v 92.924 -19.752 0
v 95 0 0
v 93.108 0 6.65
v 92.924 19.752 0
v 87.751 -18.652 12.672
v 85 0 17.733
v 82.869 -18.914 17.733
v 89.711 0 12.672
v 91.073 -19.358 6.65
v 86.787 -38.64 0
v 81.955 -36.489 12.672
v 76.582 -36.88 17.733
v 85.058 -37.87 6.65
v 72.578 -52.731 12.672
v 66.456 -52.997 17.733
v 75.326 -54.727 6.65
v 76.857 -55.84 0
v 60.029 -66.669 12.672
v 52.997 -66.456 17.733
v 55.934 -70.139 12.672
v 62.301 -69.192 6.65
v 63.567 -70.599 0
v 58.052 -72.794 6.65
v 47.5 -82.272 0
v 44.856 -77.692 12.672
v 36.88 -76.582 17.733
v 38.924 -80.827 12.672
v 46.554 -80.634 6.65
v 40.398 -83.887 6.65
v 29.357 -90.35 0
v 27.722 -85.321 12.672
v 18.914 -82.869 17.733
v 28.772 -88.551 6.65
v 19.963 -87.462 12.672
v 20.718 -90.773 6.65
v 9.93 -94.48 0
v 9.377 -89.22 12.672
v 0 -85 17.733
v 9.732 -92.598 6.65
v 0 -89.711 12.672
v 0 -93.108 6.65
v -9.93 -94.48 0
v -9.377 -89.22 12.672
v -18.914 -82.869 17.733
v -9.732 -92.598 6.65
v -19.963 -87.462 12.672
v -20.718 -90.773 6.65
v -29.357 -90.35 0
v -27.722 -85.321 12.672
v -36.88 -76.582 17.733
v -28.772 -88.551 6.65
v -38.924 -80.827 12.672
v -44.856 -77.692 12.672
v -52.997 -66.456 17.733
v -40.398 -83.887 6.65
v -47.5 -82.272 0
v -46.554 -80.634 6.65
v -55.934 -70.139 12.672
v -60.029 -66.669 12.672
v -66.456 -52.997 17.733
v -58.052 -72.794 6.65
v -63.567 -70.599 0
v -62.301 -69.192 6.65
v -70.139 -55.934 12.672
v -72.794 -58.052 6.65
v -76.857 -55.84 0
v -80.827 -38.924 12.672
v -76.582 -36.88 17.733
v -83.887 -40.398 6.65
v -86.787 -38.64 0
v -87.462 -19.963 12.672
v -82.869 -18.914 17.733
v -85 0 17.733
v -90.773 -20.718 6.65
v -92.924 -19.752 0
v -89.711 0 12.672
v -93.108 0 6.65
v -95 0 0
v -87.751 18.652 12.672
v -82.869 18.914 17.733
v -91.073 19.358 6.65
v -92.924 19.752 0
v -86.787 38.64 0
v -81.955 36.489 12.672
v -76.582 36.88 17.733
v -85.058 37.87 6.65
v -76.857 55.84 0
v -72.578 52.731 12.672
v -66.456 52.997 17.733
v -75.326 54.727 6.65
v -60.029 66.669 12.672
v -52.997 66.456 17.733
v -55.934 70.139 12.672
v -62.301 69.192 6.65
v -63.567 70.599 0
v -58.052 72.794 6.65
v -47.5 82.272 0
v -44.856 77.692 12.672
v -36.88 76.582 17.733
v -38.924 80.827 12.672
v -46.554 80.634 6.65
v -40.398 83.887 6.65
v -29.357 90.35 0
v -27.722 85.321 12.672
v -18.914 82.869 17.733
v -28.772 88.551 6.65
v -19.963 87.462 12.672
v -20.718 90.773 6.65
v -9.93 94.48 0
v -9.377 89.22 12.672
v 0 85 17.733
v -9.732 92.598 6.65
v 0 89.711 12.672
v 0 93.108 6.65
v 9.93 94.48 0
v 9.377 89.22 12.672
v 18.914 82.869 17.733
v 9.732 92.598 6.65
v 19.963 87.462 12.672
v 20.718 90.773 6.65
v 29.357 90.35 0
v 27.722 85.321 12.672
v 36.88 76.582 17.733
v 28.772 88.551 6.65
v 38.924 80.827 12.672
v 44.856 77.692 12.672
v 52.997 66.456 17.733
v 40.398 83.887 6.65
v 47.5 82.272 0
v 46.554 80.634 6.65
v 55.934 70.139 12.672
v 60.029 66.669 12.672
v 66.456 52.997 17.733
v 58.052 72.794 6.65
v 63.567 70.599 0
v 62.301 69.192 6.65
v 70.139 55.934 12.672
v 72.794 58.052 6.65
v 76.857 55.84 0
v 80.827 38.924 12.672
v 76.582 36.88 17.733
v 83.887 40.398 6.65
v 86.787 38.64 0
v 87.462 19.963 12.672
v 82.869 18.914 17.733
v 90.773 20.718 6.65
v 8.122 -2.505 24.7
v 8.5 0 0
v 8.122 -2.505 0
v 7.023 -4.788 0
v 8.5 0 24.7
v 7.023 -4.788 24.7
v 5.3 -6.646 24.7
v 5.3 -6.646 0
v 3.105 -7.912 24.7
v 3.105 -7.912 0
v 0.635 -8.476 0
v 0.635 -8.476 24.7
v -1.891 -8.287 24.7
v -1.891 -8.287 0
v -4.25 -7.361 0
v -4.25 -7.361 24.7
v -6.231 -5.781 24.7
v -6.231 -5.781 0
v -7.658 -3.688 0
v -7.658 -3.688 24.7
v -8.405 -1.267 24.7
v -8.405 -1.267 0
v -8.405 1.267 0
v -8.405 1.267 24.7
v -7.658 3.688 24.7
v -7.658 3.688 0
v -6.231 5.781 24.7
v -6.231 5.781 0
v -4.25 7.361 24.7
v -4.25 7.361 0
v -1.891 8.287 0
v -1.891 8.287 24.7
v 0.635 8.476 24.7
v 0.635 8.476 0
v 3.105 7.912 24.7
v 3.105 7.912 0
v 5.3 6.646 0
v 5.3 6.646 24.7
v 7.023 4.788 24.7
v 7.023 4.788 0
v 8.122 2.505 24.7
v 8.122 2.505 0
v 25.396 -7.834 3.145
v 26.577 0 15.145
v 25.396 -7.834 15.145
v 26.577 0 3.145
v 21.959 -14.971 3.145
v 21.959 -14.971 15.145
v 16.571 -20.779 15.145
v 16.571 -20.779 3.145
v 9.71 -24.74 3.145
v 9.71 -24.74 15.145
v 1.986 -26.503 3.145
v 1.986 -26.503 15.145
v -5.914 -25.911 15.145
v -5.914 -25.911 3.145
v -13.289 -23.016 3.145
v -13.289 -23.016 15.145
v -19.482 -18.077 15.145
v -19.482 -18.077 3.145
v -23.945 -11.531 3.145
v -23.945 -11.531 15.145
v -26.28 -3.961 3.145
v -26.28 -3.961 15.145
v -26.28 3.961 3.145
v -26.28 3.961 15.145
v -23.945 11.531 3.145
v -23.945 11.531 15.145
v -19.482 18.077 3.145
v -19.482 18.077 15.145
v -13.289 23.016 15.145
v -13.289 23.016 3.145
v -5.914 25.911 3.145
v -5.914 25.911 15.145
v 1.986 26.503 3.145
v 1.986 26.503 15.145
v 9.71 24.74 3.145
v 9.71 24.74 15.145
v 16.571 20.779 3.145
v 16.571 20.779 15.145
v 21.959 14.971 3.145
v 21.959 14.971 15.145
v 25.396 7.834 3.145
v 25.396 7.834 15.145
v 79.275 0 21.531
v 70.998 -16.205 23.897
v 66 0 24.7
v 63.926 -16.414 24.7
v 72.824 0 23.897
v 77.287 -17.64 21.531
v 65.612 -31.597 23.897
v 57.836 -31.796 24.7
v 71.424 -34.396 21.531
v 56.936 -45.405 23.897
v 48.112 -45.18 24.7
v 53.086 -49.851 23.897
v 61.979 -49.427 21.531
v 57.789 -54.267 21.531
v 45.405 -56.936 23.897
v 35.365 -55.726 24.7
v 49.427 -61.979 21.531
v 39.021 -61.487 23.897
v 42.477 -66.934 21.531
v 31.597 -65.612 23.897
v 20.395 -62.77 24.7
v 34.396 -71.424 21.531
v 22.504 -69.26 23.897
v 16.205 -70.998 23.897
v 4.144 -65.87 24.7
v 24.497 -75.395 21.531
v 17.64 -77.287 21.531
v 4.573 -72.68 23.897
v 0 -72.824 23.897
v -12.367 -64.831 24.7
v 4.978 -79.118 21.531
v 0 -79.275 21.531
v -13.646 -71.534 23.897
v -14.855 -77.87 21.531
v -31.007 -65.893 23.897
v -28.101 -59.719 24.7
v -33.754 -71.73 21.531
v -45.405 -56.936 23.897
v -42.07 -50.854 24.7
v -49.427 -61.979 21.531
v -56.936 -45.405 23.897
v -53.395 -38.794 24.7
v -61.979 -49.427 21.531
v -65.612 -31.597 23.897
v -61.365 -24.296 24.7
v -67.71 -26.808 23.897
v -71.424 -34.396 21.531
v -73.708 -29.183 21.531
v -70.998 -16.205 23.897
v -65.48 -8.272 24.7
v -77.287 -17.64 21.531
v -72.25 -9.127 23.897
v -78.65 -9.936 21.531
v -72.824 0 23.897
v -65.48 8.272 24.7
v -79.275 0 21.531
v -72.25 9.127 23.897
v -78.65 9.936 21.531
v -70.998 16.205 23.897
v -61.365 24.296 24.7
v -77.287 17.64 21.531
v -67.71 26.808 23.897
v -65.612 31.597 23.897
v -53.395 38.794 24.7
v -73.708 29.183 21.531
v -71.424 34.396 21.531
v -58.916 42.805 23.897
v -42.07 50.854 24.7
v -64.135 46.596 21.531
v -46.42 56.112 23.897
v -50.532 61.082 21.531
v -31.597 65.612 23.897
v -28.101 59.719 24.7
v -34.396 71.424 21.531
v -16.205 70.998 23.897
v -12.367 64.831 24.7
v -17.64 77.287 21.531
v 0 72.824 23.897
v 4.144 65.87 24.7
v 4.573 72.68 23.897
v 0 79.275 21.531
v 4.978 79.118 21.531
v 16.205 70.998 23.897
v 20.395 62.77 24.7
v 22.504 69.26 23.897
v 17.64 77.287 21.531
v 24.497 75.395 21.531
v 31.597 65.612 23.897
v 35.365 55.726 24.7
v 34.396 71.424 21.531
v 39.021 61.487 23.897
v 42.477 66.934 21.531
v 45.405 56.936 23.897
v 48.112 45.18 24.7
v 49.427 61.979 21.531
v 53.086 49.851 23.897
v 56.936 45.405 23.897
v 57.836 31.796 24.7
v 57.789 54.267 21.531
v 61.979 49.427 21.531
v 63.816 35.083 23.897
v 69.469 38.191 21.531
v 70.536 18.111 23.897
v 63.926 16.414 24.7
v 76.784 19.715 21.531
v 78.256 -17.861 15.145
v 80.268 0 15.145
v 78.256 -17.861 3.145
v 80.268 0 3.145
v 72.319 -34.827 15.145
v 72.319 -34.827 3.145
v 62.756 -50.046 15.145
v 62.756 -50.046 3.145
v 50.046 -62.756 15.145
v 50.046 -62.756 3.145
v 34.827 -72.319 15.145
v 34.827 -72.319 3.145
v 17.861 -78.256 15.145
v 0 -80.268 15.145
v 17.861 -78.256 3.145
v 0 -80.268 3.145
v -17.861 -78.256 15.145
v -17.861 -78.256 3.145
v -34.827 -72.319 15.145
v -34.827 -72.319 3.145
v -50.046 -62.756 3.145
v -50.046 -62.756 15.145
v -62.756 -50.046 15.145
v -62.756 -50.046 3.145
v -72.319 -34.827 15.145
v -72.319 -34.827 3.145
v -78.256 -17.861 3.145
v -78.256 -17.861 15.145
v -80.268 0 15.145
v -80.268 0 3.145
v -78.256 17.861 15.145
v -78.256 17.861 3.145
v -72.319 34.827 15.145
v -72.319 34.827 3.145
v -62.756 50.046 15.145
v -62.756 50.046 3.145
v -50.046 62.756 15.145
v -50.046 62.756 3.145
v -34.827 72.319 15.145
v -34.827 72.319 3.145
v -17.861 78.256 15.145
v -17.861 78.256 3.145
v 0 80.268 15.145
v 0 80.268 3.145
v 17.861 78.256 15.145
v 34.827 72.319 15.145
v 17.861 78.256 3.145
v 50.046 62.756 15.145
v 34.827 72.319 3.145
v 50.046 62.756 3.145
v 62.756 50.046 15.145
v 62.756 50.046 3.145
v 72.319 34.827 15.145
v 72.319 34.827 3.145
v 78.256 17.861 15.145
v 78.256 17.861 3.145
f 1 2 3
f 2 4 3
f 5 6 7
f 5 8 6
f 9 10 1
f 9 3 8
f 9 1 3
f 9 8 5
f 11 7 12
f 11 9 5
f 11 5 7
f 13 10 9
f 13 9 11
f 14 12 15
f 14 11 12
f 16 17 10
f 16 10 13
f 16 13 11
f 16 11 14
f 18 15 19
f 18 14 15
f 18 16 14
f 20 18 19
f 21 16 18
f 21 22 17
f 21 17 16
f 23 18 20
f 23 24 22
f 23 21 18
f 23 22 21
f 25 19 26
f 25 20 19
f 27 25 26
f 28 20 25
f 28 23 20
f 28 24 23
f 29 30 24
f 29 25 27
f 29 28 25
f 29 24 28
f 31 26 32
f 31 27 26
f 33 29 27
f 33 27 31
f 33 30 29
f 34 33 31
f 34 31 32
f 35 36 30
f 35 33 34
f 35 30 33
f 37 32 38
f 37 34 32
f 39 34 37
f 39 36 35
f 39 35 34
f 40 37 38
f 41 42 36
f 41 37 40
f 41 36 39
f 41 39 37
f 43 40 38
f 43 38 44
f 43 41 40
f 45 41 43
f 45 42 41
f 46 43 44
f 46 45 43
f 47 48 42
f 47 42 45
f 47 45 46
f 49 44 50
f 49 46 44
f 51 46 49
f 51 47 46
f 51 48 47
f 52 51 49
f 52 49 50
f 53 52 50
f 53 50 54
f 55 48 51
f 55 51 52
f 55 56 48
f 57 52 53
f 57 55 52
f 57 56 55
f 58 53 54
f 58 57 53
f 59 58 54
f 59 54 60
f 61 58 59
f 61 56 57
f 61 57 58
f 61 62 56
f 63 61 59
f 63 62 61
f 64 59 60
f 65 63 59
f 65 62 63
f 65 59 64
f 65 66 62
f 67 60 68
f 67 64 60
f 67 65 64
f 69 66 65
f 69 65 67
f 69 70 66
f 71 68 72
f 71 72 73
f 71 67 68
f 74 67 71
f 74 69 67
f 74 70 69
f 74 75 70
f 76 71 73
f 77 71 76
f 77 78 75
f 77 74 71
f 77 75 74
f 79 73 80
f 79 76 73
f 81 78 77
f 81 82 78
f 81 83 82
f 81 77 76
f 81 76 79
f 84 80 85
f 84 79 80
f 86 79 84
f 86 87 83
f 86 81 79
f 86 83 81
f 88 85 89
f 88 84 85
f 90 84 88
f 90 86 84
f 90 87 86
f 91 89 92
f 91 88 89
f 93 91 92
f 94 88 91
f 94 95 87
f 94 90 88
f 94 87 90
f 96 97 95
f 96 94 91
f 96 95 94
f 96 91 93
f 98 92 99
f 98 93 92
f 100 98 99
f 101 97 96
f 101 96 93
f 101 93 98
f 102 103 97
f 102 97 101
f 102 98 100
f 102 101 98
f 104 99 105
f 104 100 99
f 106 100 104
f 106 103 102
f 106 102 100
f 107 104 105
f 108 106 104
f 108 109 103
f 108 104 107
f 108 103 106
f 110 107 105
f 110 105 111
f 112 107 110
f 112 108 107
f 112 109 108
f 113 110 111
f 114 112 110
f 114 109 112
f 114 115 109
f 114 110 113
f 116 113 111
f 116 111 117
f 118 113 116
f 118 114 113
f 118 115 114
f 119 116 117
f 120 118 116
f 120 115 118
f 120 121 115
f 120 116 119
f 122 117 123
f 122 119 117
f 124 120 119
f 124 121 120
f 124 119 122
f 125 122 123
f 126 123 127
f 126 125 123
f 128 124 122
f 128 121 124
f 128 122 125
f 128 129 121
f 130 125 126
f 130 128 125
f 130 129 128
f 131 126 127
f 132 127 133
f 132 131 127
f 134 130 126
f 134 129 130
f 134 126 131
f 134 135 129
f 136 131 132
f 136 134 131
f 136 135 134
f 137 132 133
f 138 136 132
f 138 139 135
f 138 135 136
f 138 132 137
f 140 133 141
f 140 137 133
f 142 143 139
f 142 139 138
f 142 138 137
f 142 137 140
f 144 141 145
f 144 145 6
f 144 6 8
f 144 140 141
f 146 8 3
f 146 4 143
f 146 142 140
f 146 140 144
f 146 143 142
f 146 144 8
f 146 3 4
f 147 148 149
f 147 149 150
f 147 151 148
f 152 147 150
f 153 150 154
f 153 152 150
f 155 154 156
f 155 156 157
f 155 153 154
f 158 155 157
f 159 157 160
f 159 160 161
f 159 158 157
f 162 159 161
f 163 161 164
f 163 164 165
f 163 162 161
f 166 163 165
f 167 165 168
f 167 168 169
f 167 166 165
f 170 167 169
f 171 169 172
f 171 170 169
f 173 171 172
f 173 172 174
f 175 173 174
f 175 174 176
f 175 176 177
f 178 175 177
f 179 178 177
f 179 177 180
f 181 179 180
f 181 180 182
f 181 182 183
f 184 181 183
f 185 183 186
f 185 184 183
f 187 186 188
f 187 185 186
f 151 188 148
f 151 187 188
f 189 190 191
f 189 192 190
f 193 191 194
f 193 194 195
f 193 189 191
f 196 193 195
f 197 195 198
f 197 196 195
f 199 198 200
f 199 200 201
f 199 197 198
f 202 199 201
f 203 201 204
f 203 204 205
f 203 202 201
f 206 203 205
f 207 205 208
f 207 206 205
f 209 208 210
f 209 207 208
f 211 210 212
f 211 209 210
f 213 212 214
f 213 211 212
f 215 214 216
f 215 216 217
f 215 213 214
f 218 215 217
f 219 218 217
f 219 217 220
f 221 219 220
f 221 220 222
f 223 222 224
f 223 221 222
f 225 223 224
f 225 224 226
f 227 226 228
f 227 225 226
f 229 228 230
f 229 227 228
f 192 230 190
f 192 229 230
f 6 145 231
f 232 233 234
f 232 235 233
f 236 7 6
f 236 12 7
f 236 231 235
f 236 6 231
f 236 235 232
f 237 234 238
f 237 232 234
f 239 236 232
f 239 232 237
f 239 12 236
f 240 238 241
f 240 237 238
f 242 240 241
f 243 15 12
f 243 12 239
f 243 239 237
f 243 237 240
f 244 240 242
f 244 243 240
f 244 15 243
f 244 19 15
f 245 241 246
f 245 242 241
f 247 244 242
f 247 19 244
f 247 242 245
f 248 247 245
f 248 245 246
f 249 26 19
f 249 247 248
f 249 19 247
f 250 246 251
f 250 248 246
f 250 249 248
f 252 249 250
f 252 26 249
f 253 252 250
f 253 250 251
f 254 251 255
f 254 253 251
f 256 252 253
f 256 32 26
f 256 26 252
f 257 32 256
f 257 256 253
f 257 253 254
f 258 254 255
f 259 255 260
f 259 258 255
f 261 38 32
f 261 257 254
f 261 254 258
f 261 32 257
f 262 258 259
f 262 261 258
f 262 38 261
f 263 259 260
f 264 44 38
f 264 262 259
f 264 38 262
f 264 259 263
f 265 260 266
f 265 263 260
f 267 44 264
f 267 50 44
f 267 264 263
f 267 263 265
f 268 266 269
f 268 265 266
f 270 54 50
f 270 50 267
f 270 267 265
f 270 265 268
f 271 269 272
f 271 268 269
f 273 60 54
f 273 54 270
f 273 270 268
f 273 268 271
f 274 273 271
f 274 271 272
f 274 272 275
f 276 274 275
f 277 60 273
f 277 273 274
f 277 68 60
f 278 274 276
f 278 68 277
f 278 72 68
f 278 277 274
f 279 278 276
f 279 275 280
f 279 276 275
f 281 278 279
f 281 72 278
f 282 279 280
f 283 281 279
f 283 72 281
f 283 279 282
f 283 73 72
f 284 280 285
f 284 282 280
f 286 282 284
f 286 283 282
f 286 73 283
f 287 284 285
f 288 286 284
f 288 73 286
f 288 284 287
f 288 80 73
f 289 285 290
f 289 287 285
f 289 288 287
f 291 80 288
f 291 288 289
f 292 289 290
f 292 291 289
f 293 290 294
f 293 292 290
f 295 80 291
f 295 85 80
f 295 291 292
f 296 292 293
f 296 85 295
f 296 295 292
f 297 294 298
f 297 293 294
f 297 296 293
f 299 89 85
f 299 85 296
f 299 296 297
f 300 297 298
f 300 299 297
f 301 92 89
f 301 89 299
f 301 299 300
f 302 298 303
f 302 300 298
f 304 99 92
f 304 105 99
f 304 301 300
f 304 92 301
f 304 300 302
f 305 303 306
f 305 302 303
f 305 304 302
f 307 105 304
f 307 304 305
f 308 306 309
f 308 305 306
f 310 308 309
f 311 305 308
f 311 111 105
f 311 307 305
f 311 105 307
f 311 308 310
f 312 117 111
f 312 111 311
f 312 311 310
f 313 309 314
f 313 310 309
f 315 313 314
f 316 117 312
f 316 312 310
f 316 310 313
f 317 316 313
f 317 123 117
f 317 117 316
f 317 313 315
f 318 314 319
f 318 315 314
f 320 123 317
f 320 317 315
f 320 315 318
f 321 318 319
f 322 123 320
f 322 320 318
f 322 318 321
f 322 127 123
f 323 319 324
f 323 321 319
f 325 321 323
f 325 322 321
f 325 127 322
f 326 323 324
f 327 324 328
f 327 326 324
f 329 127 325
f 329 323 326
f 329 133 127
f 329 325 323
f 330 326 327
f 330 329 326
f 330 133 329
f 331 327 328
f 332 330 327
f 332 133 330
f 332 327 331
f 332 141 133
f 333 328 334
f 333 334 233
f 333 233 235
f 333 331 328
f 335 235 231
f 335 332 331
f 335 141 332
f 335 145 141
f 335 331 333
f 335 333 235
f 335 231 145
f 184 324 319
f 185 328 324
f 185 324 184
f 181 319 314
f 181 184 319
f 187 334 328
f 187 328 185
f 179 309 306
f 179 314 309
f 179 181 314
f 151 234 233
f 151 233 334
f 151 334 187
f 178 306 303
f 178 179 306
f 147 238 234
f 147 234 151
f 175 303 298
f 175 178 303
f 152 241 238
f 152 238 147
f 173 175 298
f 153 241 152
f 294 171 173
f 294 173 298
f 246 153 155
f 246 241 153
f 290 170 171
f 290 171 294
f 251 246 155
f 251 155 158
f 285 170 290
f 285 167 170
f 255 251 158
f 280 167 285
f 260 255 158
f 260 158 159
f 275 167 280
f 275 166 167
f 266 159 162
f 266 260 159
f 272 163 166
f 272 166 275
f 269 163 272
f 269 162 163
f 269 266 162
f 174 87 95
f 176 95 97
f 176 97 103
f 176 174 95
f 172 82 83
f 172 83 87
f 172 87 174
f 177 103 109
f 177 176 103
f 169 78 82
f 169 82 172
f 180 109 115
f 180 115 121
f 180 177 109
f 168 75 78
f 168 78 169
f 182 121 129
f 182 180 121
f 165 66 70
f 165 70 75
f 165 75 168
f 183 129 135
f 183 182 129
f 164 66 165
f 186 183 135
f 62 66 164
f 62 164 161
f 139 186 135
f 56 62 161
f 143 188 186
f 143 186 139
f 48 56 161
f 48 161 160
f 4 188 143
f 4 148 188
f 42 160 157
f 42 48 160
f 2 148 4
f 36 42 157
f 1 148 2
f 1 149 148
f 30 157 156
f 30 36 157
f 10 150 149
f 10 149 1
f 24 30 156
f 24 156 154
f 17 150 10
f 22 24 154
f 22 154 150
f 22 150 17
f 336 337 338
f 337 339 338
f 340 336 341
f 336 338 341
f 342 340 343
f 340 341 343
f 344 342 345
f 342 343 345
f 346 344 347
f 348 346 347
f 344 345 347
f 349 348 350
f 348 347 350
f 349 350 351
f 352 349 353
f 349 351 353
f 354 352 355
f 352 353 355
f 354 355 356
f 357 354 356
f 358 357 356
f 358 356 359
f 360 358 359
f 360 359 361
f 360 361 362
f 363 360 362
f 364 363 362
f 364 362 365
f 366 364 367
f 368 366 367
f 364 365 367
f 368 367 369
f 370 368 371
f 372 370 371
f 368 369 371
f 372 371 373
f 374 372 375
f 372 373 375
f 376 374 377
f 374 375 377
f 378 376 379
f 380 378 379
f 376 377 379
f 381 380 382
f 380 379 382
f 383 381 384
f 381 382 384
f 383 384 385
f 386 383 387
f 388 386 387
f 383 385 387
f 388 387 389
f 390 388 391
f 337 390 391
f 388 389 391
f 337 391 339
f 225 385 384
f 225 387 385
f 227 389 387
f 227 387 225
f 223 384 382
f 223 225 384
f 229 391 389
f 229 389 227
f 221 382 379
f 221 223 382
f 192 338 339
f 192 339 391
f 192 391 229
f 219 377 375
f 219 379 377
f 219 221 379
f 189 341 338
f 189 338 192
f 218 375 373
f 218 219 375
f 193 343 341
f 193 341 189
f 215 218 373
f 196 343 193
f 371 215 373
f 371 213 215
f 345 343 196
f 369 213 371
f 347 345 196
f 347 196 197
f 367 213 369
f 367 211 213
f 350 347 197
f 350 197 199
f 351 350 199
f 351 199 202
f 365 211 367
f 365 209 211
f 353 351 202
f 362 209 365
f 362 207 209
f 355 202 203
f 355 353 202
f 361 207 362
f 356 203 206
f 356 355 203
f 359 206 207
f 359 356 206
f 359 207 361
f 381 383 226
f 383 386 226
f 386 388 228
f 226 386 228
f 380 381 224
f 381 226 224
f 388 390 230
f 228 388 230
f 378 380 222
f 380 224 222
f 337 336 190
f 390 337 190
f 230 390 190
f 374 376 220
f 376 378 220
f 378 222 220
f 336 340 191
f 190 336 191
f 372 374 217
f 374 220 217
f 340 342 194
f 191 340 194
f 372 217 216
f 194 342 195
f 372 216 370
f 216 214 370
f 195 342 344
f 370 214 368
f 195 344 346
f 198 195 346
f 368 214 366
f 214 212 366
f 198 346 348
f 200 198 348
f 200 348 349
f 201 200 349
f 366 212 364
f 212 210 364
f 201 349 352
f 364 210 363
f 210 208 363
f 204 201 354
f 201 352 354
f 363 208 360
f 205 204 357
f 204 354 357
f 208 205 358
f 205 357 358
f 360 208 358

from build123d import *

# Parameters (mm, degrees)
SKETCH1_W = 12
SKETCH1_H = 53.690960396


with BuildPart() as part:
    # Sketch1 → Revolve1 (revolve)
    with BuildSketch(Plane(origin=(0, 0, 0), x_dir=(0, 0, -1), z_dir=(1, 0, 0)), mode=Mode.PRIVATE) as revolve1_sk:
        with BuildLine():
            Line((0, 8.5), (-24.7, 8.5))
            Line((-24.7, 8.5), (-24.7, 66))
            ThreePointArc((-24.7, 66), (-22.903230037, 76.118602871), (-17.732611951, 85))
            ThreePointArc((-17.732611951, 85), (-9.761601016, 91.587591953), (0, 95))
            Line((0, 95), (0, 8.5))
        make_face()
        with Locations((-9.145311229, 53.422633767)):
            Rectangle(SKETCH1_W, SKETCH1_H, mode=Mode.SUBTRACT)
    revolve(revolve1_sk.sketch.rotate(Axis((0, 0, 15.387931034), (0, 0, -1)), 90), axis=Axis((0, 0, 15.387931034), (0, 0, -1)))


solid = part.part
